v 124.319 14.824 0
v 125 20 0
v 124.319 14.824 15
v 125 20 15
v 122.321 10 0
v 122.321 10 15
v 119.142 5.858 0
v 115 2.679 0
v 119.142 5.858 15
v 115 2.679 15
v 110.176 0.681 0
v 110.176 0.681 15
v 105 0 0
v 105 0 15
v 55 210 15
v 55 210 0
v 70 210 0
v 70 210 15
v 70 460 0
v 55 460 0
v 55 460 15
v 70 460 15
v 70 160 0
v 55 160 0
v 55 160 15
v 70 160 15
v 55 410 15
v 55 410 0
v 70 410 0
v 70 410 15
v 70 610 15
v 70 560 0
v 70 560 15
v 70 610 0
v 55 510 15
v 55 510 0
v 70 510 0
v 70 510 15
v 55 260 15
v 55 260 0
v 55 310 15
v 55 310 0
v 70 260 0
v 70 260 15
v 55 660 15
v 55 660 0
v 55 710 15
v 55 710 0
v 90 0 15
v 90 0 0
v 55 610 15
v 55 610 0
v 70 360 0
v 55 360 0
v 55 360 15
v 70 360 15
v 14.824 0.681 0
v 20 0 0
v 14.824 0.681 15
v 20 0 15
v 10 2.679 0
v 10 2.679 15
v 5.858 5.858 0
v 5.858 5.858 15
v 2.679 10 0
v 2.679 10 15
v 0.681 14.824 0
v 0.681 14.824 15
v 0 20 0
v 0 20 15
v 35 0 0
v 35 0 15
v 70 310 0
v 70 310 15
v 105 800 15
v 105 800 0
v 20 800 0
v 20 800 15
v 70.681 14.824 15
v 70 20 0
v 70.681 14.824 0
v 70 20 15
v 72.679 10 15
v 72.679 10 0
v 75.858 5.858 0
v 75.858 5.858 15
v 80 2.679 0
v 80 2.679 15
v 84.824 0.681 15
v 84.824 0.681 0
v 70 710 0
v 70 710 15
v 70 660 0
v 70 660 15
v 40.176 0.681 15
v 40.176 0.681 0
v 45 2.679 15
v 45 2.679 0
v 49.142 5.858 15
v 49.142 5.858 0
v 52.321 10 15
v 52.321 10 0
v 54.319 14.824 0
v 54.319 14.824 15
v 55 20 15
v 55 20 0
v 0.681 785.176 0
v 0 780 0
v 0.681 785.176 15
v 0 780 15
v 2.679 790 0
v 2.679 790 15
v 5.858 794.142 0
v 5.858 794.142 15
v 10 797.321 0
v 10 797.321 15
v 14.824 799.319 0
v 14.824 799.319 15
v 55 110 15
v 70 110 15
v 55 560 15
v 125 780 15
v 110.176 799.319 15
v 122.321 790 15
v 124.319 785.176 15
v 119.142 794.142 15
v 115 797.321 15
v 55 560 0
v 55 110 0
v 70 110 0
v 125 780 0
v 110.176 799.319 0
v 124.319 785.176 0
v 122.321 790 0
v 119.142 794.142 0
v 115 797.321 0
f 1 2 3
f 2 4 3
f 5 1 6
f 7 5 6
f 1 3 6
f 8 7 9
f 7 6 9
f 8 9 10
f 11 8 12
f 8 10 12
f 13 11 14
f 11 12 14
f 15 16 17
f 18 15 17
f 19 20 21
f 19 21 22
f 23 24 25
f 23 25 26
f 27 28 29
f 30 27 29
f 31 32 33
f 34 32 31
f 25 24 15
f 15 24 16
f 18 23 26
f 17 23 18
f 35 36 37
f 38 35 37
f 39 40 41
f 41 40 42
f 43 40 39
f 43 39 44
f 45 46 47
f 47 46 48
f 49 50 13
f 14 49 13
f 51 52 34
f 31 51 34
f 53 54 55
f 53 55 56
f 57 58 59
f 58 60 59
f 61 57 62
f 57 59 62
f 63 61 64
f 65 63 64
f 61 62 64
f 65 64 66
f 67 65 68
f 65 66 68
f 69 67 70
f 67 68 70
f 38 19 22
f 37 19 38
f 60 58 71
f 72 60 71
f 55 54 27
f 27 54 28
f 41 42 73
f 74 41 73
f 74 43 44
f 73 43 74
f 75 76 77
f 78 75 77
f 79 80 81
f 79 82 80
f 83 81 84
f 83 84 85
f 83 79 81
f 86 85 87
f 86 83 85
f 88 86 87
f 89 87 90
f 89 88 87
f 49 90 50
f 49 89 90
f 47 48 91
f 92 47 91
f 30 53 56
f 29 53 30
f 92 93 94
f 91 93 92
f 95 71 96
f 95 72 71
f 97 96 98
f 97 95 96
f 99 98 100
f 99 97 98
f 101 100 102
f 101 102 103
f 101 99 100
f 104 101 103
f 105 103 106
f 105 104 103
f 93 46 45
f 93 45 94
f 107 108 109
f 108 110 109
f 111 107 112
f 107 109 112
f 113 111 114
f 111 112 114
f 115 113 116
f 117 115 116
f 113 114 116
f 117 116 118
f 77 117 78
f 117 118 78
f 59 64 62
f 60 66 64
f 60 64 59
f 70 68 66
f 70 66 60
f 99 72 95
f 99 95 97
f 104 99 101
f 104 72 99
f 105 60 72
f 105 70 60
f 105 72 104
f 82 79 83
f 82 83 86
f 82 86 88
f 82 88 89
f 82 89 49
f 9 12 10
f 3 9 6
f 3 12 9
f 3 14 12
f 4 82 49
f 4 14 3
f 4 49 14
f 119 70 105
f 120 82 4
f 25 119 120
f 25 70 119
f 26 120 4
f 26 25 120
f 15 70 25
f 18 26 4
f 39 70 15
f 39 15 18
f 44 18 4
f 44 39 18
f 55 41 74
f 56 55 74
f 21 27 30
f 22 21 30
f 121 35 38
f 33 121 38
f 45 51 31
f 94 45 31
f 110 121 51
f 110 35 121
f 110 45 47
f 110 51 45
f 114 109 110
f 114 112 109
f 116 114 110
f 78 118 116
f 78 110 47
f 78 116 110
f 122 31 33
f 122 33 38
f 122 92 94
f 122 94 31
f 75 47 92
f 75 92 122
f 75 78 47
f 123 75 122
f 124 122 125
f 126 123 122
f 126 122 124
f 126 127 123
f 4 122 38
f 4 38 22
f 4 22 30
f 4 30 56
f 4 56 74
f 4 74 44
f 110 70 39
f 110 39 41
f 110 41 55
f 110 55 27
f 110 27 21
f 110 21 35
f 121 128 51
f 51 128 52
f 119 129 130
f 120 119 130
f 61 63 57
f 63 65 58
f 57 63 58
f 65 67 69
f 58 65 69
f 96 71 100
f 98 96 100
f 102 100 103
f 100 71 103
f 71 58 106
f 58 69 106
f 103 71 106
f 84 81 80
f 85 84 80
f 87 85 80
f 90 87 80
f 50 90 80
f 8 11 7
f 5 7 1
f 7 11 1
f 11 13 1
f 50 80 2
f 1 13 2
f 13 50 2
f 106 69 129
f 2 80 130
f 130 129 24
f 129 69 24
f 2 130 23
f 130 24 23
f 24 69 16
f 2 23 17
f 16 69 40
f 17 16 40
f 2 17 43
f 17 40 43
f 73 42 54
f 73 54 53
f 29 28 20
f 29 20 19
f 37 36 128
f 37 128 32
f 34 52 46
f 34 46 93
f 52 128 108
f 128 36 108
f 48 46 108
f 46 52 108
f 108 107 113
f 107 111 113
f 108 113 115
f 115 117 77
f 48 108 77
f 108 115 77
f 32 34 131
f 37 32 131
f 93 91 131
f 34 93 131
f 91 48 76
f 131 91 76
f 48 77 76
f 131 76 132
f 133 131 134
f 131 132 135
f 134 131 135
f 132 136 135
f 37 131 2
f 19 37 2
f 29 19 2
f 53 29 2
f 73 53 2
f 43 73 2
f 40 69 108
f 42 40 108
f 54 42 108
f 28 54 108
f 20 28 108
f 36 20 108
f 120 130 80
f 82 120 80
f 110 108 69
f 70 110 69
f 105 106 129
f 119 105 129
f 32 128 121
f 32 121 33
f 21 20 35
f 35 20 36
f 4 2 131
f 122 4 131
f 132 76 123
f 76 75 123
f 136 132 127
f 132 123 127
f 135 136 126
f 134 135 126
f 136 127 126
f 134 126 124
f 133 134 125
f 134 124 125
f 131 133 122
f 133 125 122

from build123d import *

# Parameters (mm, degrees)
ESQUISSE1_W        = 15
ESQUISSE1_H        = 50
BOSS_EXTRU_1_DEPTH = 15
CONG_1_R           = 20


with BuildPart() as part:
    # Esquisse1 → Boss.-Extru.1 (new body)
    with BuildSketch(Plane.XY):
        Polygon((0, 0), (55, 0), (55, 110), (70, 110), (70, 0), (125, 0), (125, 800), (0, 800), align=None)
        with Locations((62.5, 185)):
            Rectangle(ESQUISSE1_W, ESQUISSE1_H, mode=Mode.SUBTRACT)
        with Locations((62.5, 285)):
            Rectangle(ESQUISSE1_W, ESQUISSE1_H, mode=Mode.SUBTRACT)
        with Locations((62.5, 385)):
            Rectangle(ESQUISSE1_W, ESQUISSE1_H, mode=Mode.SUBTRACT)
        with Locations((62.5, 485)):
            Rectangle(ESQUISSE1_W, ESQUISSE1_H, mode=Mode.SUBTRACT)
        with Locations((62.5, 585)):
            Rectangle(ESQUISSE1_W, ESQUISSE1_H, mode=Mode.SUBTRACT)
        with Locations((62.5, 685)):
            Rectangle(ESQUISSE1_W, ESQUISSE1_H, mode=Mode.SUBTRACT)
    extrude(amount=BOSS_EXTRU_1_DEPTH)

    # Congé1
    cong_1_edges = [part.edges().sort_by_distance(p)[0] for p in [
        (0, 800, 7.5),
        (125, 800, 7.5),
        (125, 0, 7.5),
        (70, 0, 7.5),
        (55, 0, 7.5),
        (0, 0, 7.5),
    ]]
    fillet(cong_1_edges, radius=CONG_1_R)


solid = part.part
